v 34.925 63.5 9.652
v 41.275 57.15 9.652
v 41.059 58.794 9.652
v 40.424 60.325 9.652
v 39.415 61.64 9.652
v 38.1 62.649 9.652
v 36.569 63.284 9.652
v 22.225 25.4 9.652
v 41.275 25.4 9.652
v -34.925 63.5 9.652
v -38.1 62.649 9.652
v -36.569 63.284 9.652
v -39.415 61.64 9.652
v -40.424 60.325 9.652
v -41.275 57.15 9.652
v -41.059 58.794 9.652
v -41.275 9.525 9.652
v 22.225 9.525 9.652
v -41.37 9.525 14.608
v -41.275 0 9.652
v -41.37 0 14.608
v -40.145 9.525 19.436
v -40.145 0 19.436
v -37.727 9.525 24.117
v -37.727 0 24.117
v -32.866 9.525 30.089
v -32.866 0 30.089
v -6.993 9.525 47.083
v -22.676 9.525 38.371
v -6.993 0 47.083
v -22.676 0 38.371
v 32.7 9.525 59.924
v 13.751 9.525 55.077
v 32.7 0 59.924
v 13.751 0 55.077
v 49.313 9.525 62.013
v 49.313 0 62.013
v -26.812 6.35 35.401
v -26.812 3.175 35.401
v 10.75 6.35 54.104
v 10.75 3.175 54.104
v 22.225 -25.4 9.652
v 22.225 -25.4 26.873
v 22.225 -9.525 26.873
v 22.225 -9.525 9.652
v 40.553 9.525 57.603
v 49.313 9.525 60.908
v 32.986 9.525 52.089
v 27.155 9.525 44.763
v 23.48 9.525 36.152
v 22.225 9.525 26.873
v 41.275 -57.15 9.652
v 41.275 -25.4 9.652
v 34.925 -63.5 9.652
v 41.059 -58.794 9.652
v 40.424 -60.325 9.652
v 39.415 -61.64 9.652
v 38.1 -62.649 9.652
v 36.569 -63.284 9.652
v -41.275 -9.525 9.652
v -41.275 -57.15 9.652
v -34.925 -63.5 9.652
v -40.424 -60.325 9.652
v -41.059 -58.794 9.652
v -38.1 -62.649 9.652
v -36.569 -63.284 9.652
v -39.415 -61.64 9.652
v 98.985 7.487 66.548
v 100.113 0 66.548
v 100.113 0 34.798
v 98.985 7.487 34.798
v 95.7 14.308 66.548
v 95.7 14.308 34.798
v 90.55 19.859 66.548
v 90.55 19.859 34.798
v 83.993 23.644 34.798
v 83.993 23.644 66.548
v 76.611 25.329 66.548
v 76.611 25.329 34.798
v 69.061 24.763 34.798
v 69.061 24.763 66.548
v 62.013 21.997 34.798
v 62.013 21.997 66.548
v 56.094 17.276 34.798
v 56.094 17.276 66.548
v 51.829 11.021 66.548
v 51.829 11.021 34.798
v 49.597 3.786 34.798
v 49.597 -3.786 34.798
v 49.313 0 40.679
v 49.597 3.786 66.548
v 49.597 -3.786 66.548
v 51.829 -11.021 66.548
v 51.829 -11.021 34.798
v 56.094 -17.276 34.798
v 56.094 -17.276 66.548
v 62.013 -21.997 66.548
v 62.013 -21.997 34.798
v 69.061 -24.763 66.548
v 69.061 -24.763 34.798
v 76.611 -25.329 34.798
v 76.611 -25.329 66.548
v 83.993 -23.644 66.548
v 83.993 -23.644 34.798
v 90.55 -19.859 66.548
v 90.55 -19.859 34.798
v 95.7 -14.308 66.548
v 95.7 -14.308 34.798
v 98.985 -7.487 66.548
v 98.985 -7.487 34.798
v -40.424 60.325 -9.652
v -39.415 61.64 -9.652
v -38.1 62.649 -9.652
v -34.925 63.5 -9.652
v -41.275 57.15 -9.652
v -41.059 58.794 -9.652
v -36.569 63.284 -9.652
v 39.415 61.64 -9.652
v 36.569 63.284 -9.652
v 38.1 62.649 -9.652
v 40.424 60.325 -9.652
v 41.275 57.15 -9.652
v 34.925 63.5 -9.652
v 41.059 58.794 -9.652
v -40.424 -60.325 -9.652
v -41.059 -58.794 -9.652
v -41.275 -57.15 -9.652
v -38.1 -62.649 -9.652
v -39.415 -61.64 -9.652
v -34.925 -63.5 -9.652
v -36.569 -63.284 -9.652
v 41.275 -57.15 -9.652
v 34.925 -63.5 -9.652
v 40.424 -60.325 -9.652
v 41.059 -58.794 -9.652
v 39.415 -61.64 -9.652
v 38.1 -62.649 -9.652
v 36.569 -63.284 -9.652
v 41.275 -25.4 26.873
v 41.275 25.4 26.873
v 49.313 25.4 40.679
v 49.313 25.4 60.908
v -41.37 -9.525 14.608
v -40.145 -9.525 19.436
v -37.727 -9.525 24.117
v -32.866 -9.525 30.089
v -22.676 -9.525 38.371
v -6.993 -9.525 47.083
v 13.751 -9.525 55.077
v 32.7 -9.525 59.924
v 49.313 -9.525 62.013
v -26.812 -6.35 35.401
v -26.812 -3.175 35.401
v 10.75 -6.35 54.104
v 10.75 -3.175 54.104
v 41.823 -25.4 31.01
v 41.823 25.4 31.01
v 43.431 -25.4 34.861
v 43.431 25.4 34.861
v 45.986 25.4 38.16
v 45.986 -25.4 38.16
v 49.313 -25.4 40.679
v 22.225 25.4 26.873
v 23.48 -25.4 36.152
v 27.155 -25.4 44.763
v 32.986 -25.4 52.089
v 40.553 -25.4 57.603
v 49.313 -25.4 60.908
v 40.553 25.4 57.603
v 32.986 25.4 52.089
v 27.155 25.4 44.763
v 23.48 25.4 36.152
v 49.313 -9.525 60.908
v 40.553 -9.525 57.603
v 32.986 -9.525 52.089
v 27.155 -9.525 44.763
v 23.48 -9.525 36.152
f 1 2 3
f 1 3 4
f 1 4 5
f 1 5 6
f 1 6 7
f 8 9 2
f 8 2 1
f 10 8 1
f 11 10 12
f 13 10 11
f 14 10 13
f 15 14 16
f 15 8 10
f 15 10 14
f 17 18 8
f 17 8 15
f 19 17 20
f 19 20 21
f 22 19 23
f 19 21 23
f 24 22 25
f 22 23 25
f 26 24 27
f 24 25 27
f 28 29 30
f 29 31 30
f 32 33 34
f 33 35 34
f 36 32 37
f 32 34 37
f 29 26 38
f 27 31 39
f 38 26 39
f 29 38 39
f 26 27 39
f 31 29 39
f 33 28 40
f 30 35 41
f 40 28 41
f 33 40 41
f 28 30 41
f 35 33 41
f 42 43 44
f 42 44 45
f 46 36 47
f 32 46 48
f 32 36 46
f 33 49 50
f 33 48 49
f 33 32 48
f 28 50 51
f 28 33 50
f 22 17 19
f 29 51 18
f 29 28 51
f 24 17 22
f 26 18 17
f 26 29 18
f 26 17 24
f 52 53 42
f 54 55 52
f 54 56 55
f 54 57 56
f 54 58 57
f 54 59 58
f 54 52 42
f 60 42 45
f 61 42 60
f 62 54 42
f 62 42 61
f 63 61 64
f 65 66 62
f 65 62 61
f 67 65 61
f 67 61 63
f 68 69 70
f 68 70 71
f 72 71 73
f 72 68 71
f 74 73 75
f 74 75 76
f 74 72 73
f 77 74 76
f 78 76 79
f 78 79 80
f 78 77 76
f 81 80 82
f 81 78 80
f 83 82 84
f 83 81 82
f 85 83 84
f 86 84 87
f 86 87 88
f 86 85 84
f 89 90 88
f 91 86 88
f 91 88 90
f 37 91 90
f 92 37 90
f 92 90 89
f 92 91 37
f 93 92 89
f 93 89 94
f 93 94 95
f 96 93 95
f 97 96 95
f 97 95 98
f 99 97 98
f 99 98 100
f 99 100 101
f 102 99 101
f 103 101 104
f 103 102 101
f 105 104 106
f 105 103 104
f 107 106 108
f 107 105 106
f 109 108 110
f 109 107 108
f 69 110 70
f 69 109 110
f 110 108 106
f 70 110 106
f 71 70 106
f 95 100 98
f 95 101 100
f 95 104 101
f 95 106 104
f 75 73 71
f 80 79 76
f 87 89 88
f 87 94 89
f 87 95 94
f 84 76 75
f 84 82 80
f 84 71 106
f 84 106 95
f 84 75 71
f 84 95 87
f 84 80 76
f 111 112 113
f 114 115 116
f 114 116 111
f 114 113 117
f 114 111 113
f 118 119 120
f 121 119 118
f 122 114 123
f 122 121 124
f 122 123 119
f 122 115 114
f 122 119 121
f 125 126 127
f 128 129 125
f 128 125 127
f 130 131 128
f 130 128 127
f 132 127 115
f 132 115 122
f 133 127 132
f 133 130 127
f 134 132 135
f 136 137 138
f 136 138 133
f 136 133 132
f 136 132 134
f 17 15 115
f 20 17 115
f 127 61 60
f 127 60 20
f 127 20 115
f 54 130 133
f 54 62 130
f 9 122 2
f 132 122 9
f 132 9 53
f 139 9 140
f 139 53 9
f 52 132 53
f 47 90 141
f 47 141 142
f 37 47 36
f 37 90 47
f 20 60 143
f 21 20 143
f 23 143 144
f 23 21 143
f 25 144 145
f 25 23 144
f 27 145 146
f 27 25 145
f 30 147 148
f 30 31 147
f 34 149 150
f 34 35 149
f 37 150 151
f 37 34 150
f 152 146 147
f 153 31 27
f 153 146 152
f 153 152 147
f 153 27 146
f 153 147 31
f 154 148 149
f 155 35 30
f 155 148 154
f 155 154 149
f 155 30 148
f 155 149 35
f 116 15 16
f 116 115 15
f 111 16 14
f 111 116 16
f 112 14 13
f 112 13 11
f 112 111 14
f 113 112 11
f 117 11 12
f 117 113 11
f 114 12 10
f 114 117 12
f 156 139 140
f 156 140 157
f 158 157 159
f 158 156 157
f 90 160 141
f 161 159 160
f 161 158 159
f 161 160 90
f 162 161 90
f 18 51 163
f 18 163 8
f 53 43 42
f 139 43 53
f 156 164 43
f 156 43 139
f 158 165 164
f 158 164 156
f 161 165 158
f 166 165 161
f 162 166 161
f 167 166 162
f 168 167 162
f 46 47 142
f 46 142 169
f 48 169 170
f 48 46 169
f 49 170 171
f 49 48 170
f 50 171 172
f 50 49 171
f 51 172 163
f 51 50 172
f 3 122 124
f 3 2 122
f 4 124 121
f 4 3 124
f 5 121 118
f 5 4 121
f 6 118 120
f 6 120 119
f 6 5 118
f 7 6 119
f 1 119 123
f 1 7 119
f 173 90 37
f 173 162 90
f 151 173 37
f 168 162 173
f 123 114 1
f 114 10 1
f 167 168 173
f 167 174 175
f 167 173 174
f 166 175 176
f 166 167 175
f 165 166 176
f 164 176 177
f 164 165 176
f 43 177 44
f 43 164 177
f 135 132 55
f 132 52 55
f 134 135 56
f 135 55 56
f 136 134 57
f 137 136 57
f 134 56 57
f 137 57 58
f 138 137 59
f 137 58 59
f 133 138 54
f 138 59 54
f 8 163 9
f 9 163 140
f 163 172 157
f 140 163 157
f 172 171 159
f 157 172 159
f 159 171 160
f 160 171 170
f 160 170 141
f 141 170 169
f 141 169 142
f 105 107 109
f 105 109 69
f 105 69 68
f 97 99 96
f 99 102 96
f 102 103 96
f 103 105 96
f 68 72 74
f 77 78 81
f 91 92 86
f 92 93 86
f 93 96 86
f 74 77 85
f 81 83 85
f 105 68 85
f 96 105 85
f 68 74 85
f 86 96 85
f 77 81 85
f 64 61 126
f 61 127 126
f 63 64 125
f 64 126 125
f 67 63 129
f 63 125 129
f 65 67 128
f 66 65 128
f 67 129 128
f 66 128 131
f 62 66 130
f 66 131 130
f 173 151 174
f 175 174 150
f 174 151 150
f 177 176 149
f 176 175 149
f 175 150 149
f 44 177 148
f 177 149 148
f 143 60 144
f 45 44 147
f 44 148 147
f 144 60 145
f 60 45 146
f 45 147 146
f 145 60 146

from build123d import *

# Parameters (mm, degrees)
F1_DEPTH = 63.5
F2_DEPTH = 25.4
F3_DEPTH = 9.525
F0_W     = 25.4
F0_H     = 31.75
F5_R     = 6.35


with BuildPart() as f1:
    # F0 (on Front) → F1 (new body, symmetric)
    with BuildSketch(Plane.XZ):
        Polygon((22.225, 9.652), (-41.275, 9.652), (-41.275, -9.652), (41.275, -9.652), (41.275, 9.652), align=None)
    extrude(amount=F1_DEPTH, both=True)

    # F0 (on Front) → F2 (join, symmetric)
    with BuildSketch(Plane.XZ):
        with BuildLine():
            Line((22.225, 26.8732), (22.225, 9.652))
            Line((22.225, 9.652), (41.275, 9.652))
            Line((41.275, 9.652), (41.275, 26.8732))
            ThreePointArc((41.275, 26.8732), (43.430921, 34.860847), (49.313111, 40.678952))
            Line((49.313111, 40.678952), (49.313111, 60.907577))
            ThreePointArc((49.313111, 60.907577), (29.823649, 48.622364), (22.225, 26.8732))
        make_face()
    extrude(amount=F2_DEPTH, both=True)

    # F0 (on Front) → F3 (join, symmetric)
    with BuildSketch(Plane.XZ):
        with BuildLine():
            add(Edge.make_bspline(
                [(-41.275, 9.652), (-45.728246, 37.67528), (17.61539, 60.750201), (49.313111, 62.013091)],
                knots=[0, 0, 0, 0, 102.039446, 102.039446, 102.039446, 102.039446], degree=3))
            Line((-41.275, 9.652), (22.225, 9.652))
            Line((22.225, 9.652), (22.225, 26.8732))
            ThreePointArc((22.225, 26.8732), (29.823649, 48.622364), (49.313111, 60.907577))
            Line((49.313111, 60.907577), (49.313111, 62.013091))
        make_face()
    extrude(amount=F3_DEPTH, both=True)

    # F0 (on Front) → F4 (revolve)
    with BuildSketch(Plane.XZ):
        with Locations((87.413111, 50.673)):
            Rectangle(F0_W, F0_H)
    revolve(axis=Axis((74.713111, 0, 50.673), (0, 0, 1)))

    # F5
    f5_edges = [f1.edges().sort_by_distance(p)[0] for p in [
        (41.275, -63.5, 0),
        (-41.275, -63.5, 0),
        (-41.275, 63.5, 0),
        (41.275, 63.5, 0),
    ]]
    fillet(f5_edges, radius=F5_R)


solid = f1.part
